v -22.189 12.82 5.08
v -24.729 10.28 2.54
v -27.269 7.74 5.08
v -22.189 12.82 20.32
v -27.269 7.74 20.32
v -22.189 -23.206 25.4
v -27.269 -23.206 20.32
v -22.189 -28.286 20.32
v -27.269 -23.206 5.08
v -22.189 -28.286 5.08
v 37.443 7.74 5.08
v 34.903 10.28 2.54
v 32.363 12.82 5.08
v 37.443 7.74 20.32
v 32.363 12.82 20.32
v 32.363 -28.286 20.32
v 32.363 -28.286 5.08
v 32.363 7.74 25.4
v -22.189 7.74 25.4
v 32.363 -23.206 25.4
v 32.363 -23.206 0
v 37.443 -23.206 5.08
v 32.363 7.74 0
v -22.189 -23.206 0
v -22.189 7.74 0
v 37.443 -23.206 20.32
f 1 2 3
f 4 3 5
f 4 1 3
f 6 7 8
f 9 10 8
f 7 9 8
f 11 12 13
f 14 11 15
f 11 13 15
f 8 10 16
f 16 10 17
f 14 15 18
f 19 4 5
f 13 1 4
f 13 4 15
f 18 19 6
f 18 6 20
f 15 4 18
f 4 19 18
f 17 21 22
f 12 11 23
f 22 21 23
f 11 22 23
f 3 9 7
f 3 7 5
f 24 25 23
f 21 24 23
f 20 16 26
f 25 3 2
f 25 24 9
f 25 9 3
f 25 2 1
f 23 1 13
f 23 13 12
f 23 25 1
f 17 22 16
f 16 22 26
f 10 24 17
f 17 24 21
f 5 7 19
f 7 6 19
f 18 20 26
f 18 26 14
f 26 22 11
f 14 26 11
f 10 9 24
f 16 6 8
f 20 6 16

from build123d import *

# Parameters (mm, degrees)
F0_W     = 64.712018
F0_H     = 41.106358
F1_DEPTH = 25.4
F2_SIZE  = 5.08
F3_SIZE  = 5.08


with BuildPart() as f1:
    # F0 (on Top) → F1 (new body)
    with BuildSketch(Plane.XY):
        with Locations((5.08742, -7.732876)):
            Rectangle(F0_W, F0_H)
    extrude(amount=F1_DEPTH)

    # F2
    f2_edges = [f1.edges().sort_by_distance(p)[0] for p in [
        (5.08742, 12.820303, 25.4),
        (37.443429, -7.732876, 0),
        (37.443429, 12.820303, 12.7),
        (-27.268589, 12.820303, 12.7),
        (-27.268589, -7.732876, 25.4),
        (-27.268589, -7.732876, 0),
        (-27.268589, -28.286055, 12.7),
        (5.08742, -28.286055, 0),
        (5.08742, -28.286055, 25.4),
        (37.443429, -28.286055, 12.7),
        (37.443429, -7.732876, 25.4),
    ]]
    chamfer(f2_edges, length=F2_SIZE)

    # F3
    f3_edges = [f1.edges().sort_by_distance(p)[0] for p in [
        (5.08742, 12.820303, 0),
    ]]
    chamfer(f3_edges, length=F3_SIZE)


solid = f1.part
